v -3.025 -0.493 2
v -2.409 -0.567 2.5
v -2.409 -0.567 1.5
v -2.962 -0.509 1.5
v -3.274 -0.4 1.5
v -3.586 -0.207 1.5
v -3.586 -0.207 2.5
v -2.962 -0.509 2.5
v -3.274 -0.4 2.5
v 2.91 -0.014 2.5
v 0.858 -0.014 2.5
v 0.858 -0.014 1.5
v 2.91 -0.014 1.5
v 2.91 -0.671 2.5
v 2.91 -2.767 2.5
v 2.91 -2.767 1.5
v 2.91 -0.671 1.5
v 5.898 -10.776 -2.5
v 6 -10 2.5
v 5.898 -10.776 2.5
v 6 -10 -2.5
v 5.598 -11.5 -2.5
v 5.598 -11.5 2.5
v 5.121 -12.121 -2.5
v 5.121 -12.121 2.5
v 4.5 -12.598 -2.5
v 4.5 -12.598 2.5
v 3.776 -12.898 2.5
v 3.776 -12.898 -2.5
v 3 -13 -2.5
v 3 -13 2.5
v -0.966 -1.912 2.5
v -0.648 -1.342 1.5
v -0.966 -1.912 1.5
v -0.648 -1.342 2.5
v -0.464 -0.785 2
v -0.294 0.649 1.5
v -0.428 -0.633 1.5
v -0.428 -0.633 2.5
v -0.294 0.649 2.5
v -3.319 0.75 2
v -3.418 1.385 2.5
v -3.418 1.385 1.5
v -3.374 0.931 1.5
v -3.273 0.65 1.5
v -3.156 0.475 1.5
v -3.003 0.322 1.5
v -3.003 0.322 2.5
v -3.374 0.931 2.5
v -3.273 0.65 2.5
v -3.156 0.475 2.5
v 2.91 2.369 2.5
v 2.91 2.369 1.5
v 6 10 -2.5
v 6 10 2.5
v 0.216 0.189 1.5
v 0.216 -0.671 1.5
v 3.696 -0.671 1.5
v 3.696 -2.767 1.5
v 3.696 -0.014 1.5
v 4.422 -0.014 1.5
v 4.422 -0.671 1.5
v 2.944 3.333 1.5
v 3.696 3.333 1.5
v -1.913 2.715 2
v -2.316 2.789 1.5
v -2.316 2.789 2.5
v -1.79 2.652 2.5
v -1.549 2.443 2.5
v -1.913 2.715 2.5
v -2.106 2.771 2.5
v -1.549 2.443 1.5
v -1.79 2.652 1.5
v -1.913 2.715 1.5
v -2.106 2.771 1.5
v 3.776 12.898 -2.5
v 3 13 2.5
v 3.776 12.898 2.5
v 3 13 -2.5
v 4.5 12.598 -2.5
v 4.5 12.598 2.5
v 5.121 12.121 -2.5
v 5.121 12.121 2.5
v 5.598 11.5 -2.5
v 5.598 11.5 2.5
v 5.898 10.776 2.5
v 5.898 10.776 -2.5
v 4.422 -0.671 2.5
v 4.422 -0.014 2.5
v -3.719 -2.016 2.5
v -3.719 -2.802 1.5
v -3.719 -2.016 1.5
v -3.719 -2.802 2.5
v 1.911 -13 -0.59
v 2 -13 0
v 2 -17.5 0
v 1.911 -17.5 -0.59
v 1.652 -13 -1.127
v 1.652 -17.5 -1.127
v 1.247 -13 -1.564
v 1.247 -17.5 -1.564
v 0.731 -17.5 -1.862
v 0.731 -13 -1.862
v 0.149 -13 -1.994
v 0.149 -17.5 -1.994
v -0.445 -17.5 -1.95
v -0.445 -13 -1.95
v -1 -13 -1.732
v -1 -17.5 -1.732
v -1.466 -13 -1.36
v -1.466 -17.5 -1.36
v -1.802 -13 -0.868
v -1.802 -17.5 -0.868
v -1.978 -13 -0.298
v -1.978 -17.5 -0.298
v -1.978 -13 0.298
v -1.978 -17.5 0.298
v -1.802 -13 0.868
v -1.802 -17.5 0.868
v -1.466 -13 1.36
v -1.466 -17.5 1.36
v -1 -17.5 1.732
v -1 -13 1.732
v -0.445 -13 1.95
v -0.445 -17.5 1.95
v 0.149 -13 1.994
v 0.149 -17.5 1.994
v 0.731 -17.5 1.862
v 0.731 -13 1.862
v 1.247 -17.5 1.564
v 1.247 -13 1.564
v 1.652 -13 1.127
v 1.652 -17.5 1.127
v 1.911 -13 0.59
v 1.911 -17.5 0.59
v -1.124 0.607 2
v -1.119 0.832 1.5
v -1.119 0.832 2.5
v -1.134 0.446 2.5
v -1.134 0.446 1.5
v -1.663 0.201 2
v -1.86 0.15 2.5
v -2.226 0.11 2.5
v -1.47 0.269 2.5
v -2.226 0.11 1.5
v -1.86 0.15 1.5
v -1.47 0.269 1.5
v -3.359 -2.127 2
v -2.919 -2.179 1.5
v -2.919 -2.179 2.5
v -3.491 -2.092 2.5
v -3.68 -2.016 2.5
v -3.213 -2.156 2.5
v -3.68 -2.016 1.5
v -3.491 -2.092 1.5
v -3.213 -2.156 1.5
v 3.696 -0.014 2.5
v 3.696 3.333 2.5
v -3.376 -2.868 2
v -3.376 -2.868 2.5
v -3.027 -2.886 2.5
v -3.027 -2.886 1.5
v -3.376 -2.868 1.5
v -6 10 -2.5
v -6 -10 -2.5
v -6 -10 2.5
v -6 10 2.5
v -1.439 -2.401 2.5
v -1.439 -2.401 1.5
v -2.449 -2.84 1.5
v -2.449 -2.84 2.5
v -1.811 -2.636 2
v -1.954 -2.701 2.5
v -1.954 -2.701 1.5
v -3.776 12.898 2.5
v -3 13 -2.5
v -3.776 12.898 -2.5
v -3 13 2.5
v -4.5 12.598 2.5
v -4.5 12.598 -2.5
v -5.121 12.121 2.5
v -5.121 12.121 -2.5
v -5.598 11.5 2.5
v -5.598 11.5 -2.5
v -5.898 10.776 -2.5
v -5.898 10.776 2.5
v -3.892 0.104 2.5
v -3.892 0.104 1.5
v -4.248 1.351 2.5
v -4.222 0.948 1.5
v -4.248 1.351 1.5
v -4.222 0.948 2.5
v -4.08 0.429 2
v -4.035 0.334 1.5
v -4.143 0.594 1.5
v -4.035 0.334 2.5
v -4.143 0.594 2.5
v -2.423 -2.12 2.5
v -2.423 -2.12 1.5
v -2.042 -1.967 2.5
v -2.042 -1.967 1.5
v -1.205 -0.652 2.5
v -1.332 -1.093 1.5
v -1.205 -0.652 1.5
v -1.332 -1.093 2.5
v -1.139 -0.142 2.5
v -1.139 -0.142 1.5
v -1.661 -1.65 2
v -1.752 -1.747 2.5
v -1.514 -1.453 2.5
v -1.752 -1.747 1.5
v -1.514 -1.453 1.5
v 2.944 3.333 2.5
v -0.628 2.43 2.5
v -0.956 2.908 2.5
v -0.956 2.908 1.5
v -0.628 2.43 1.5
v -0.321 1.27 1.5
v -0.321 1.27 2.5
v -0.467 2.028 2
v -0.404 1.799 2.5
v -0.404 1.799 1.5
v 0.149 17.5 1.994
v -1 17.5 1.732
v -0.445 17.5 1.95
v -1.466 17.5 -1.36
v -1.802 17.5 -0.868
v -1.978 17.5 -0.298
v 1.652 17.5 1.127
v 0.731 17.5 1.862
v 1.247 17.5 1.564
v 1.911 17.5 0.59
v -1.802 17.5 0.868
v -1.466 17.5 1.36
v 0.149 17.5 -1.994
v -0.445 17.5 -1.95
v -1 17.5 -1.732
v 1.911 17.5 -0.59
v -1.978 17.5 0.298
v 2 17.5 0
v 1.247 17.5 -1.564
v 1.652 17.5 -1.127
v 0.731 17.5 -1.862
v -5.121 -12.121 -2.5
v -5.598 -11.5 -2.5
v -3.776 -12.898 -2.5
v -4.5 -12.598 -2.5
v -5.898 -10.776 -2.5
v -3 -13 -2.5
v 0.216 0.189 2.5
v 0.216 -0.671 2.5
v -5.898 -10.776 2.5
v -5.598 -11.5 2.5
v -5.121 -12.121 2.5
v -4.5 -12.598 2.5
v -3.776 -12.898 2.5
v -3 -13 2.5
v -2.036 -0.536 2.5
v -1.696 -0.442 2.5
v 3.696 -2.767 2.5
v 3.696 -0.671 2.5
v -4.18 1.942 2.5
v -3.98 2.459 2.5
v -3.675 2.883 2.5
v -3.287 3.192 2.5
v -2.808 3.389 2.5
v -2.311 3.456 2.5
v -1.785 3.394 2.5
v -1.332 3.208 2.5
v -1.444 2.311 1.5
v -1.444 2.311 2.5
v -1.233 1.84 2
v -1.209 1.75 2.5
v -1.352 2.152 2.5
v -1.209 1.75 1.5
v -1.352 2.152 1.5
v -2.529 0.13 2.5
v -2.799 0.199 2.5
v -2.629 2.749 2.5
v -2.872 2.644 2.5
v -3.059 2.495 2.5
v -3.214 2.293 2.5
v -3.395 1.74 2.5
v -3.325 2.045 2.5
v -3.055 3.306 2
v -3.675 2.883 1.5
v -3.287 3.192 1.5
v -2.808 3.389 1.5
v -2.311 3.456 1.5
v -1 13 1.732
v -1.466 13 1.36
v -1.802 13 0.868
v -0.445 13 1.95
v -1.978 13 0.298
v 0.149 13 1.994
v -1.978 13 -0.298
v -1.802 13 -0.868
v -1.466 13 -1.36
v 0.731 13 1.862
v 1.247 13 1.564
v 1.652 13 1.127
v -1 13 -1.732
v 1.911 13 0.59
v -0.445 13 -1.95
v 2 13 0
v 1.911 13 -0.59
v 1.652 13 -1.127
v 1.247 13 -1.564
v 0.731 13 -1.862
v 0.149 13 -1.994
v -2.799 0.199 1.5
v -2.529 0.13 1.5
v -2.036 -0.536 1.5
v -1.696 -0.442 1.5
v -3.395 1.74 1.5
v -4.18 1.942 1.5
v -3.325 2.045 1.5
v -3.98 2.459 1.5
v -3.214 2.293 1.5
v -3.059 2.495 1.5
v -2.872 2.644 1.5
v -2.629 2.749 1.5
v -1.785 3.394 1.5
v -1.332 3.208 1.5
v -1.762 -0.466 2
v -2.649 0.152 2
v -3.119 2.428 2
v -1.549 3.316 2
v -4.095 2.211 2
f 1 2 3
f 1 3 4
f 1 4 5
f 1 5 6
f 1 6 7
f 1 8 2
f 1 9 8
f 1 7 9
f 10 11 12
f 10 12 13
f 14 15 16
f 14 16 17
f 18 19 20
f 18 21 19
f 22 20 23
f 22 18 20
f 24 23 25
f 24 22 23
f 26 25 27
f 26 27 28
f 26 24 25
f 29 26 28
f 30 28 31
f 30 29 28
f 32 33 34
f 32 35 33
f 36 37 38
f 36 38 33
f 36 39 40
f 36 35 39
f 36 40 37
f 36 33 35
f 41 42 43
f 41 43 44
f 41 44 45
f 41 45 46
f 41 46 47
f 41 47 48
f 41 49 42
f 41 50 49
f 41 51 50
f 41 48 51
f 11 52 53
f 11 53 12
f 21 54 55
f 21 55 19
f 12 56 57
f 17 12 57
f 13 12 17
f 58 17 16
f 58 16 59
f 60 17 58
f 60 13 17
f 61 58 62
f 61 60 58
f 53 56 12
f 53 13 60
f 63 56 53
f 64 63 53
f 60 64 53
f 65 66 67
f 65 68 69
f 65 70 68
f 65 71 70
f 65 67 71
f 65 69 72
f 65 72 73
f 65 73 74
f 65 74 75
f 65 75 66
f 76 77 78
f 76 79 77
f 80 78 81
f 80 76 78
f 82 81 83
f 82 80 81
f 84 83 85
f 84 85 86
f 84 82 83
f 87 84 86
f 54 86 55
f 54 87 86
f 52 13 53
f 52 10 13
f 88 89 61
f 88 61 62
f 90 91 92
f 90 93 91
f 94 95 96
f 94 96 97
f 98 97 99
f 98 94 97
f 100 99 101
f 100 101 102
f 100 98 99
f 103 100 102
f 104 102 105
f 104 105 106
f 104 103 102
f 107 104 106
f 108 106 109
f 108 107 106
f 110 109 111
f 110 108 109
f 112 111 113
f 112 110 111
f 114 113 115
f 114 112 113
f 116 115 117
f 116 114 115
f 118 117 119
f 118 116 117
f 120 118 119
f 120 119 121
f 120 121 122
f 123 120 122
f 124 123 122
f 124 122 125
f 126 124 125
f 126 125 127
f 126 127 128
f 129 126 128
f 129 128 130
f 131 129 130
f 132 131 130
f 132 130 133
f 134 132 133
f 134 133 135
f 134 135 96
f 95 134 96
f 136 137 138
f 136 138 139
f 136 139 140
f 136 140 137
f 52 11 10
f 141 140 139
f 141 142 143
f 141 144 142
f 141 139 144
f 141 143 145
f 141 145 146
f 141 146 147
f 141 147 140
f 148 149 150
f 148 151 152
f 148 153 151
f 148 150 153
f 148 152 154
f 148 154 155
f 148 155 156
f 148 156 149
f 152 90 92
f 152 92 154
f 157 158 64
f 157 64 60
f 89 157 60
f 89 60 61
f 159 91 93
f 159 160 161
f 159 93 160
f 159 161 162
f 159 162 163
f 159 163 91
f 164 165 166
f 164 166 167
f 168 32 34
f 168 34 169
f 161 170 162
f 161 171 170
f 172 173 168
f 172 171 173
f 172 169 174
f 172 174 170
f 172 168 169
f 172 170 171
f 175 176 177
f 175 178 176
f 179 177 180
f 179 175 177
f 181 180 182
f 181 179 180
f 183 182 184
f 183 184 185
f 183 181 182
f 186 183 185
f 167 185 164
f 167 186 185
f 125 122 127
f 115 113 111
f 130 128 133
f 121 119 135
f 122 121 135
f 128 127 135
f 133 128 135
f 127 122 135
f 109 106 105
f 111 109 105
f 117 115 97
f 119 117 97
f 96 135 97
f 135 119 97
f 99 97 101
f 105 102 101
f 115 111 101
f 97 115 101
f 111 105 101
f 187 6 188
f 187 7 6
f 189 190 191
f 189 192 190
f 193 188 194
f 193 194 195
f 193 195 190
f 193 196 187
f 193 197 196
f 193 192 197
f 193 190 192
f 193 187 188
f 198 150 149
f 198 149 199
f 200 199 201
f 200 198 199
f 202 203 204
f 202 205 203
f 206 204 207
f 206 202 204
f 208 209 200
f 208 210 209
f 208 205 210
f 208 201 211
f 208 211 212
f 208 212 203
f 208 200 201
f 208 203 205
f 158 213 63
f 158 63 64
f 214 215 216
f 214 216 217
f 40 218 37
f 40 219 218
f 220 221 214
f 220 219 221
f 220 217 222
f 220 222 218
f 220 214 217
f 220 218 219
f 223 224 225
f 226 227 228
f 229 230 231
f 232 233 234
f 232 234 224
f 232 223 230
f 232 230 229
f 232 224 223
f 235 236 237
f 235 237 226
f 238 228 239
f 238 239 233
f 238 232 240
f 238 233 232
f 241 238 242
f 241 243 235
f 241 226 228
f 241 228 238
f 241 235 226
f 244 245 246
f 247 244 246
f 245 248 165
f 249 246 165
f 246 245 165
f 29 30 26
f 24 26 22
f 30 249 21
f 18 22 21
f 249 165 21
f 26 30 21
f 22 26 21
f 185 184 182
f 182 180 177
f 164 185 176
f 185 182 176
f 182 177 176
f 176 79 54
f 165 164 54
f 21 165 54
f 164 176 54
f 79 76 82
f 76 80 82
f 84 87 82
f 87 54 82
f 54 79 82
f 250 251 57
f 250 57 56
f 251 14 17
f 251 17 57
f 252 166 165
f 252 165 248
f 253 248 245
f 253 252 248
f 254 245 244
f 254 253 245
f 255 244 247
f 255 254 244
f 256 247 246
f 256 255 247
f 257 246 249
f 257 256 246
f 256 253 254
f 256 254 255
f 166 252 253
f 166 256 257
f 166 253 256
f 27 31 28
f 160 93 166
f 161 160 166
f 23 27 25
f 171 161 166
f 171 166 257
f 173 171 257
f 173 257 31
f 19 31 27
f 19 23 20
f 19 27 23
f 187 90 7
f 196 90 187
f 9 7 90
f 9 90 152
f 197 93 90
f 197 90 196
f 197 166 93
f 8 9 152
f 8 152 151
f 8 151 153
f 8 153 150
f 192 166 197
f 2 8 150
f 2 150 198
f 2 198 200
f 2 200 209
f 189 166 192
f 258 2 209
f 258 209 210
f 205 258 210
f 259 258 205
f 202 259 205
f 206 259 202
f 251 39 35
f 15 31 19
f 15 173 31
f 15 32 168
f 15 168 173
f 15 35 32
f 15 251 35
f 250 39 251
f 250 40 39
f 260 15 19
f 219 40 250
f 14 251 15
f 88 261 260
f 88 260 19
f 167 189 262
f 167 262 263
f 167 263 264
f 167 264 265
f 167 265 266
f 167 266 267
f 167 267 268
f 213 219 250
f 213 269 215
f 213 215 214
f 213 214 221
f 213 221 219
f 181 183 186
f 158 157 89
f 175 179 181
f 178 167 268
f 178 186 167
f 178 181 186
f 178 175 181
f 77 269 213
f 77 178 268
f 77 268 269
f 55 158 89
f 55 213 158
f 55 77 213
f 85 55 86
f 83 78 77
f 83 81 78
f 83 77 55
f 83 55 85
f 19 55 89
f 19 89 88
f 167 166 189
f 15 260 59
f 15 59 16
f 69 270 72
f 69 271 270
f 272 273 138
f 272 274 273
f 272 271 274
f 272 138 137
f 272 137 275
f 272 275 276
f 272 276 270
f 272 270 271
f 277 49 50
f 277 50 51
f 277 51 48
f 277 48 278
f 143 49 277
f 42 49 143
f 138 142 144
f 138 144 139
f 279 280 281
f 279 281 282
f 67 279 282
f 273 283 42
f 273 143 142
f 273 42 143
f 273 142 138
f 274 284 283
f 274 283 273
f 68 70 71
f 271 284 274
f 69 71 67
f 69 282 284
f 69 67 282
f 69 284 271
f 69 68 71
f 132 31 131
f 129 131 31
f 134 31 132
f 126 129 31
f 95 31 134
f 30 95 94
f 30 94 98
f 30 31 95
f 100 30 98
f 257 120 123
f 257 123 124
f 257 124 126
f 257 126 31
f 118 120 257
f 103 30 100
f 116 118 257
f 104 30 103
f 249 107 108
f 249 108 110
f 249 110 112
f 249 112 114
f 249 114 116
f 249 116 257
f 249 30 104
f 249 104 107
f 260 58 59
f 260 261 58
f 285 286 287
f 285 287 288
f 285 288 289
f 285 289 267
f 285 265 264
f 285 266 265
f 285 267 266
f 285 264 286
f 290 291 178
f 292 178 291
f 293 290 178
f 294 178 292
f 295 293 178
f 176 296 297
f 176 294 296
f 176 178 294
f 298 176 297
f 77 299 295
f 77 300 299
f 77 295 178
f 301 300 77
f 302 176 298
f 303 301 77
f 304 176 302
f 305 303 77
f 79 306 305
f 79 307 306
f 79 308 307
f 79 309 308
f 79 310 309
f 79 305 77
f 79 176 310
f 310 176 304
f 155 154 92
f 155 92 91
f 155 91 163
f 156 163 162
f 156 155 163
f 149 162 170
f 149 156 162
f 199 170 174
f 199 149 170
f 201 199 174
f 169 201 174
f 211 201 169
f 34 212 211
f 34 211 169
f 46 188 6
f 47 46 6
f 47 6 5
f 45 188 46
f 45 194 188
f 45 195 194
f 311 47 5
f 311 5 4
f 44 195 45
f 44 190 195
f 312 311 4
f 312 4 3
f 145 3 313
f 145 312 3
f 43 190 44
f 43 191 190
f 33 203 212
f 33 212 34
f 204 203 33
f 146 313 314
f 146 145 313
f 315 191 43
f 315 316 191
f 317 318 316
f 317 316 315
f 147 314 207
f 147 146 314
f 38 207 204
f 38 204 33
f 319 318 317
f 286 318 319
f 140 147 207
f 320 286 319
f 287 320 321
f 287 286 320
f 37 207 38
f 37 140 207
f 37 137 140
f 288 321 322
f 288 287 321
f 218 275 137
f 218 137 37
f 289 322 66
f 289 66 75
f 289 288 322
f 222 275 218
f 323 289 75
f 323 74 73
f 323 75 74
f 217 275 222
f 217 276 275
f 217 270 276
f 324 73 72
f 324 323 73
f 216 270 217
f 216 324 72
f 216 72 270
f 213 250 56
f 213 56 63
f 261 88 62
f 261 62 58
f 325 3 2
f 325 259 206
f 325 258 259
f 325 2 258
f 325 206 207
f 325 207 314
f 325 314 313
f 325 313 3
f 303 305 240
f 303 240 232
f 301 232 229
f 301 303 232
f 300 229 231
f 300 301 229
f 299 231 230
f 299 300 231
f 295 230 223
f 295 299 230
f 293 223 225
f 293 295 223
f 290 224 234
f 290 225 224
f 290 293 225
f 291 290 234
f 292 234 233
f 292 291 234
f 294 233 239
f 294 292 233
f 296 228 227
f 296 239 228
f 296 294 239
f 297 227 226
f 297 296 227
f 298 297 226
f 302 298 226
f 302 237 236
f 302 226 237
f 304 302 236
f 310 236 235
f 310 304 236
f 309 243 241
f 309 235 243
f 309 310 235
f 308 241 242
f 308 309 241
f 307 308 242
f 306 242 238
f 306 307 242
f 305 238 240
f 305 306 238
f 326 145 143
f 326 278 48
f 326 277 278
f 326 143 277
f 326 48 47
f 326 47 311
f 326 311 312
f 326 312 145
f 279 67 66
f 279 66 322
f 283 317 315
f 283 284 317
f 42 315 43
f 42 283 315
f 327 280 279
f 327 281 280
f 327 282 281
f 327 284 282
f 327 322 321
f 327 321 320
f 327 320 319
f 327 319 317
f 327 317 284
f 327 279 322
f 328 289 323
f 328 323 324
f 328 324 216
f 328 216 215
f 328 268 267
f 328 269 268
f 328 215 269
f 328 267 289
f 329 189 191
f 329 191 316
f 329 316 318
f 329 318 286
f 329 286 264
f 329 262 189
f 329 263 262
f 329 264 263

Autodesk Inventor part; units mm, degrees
ref_plane "YZ Plane" through (0, 0, 0) normal (1, 0, 0) x (0, 1, 0)
ref_plane "XZ Plane" through (0, 0, 0) normal (0, 1, 0) x (-1, 0, 0)
ref_plane "XY Plane" through (0, 0, 0) normal (0, 0, 1) x (1, 0, 0)
sketch "스케치1" plane through (0, 0, 0) normal (0, 0, 1) x (1, 0, 0)
  line L0 (-6, 13) -> (6, 13)
  line L1 (6, 13) -> (6, -13)
  line L2 (6, -13) -> (-6, -13)
  line L3 (-6, -13) -> (-6, 13)
  line L4 (-6, 13) -> (6, -13) construction
  line L5 (6, 13) -> (-6, -13) construction
  point P0 (0, 0)
  dimension "d0" = 12
  dimension "d1" = 26
extrude "돌출1" add sketch "스케치1" along normal mid plane 5
fillet "모깎기1" radius 3 4 edges at (6, 13, 0) (-6, 13, 0) (6, -13, 0) (-6, -13, 0)
sketch "스케치2" plane through (-3, 13, 2.5) normal (0, 1, 0) x (1, 0, 0)
  circle A0 centre (3, 2.5) radius 2
  dimension "d5" = 4
extrude "돌출2" add sketch "스케치2" along normal blind 4.5 and the other way blind 30.5
sketch "스케치3" plane through (0, 0, 2.5) normal (0, 0, 1) x (1, 0, 0)
  line L0 (-4.5251, 3.4564) -> (4.6298, 3.4564) construction
  line L1 (4.6298, 3.4564) -> (4.6298, -2.8858) construction
  line L2 (4.6298, -2.8858) -> (-4.5251, -2.8858) construction
  line L3 (-4.5251, -2.8858) -> (-4.5251, 3.4564) construction
  spline S0 degree 2 poles (-4.2483, 1.3506) (-4.2483, 1.8202) (-3.9418, 2.6012) (-3.6749, 2.883) knots 0 0 0 1 2 2 2
  spline S1 degree 2 poles (-3.6749, 2.883) (-3.4228, 3.1549) (-2.6863, 3.4564) (-2.3106, 3.4564) knots 0 0 0 1 2 2 2
  spline S2 degree 2 poles (-2.3106, 3.4564) (-1.8904, 3.4564) (-1.2082, 3.1746) (-0.9561, 2.9077) knots 0 0 0 1 2 2 2
  spline S3 degree 2 poles (-0.9561, 2.9077) (-0.6397, 2.5715) (-0.2937, 1.484) (-0.2937, 0.6486) knots 0 0 0 1 2 2 2
  spline S4 degree 2 poles (-0.2937, 0.6486) (-0.2937, -0.1077) (-0.6348, -1.4622) (-0.966, -1.912) knots 0 0 0 1 2 2 2
  spline S5 degree 2 poles (-0.966, -1.912) (-1.317, -2.3866) (-2.3056, -2.8858) (-3.0273, -2.8858) knots 0 0 0 1 2 2 2
  spline S6 degree 2 poles (-3.0273, -2.8858) (-3.1905, -2.8858) (-3.5612, -2.8512) (-3.7194, -2.8018) knots 0 0 0 1 2 2 2
  line L4 (-3.7194, -2.8018) -> (-3.7194, -2.0158)
  line L5 (-3.7194, -2.0158) -> (-3.6798, -2.0158)
  spline S7 degree 2 poles (-3.6798, -2.0158) (-3.576, -2.0751) (-3.141, -2.1789) (-2.9186, -2.1789) knots 0 0 0 1 2 2 2
  spline S8 degree 2 poles (-2.9186, -2.1789) (-2.1178, -2.1789) (-1.2033, -1.1211) (-1.139, -0.1423) knots 0 0 0 1 2 2 2
  spline S9 degree 2 poles (-1.139, -0.1423) (-1.4653, -0.3648) (-2.0585, -0.5674) (-2.4094, -0.5674) knots 0 0 0 1 2 2 2
  spline S10 degree 2 poles (-2.4094, -0.5674) (-2.7456, -0.5674) (-3.3042, -0.4191) (-3.5859, -0.2066) knots 0 0 0 1 2 2 2
  spline S11 degree 2 poles (-3.5859, -0.2066) (-3.9122, 0.0455) (-4.2483, 0.8117) (-4.2483, 1.3506) knots 0 0 0 1 2 2 2
  spline S12 degree 2 poles (-1.1192, 0.8315) (-1.1192, 1.4494) (-1.3466, 2.2305) (-1.5493, 2.443) knots 0 0 0 1 2 2 2
  spline S13 degree 2 poles (-1.5493, 2.443) (-1.7273, 2.6408) (-2.098, 2.7891) (-2.3155, 2.7891) knots 0 0 0 1 2 2 2
  spline S14 degree 2 poles (-2.3155, 2.7891) (-2.8197, 2.7891) (-3.4179, 2.0673) (-3.4179, 1.3852) knots 0 0 0 1 2 2 2
  spline S15 degree 2 poles (-3.4179, 1.3852) (-3.4179, 0.9996) (-3.2201, 0.5003) (-3.0026, 0.3224) knots 0 0 0 1 2 2 2
  spline S16 degree 2 poles (-3.0026, 0.3224) (-2.8444, 0.1938) (-2.4539, 0.1098) (-2.2265, 0.1098) knots 0 0 0 1 2 2 2
  spline S17 degree 2 poles (-2.2265, 0.1098) (-1.9645, 0.1098) (-1.3615, 0.2927) (-1.1341, 0.4459) knots 0 0 0 1 2 2 2
  spline S18 degree 2 poles (-1.1341, 0.4459) (-1.1291, 0.5053) (-1.1192, 0.7079) (-1.1192, 0.8315) knots 0 0 0 1 2 2 2
  line L6 (4.4222, -0.6712) -> (3.6955, -0.6712)
  line L7 (3.6955, -0.6712) -> (3.6955, -2.7672)
  line L8 (3.6955, -2.7672) -> (2.9095, -2.7672)
  line L9 (2.9095, -2.7672) -> (2.9095, -0.6712)
  line L10 (2.9095, -0.6712) -> (0.2155, -0.6712)
  line L11 (0.2155, -0.6712) -> (0.2155, 0.1889)
  line L12 (0.2155, 0.1889) -> (2.9441, 3.3328)
  line L13 (2.9441, 3.3328) -> (3.6955, 3.3328)
  line L14 (3.6955, 3.3328) -> (3.6955, -0.0138)
  line L15 (3.6955, -0.0138) -> (4.4222, -0.0138)
  line L16 (4.4222, -0.0138) -> (4.4222, -0.6712)
  line L17 (2.9095, -0.0138) -> (2.9095, 2.3689)
  line L18 (2.9095, 2.3689) -> (0.8581, -0.0138)
  line L19 (0.8581, -0.0138) -> (2.9095, -0.0138)
  point P0 (0, 0)
extrude "돌출3" cut sketch "스케치3" against normal blind 1
properties part number "16-2"
